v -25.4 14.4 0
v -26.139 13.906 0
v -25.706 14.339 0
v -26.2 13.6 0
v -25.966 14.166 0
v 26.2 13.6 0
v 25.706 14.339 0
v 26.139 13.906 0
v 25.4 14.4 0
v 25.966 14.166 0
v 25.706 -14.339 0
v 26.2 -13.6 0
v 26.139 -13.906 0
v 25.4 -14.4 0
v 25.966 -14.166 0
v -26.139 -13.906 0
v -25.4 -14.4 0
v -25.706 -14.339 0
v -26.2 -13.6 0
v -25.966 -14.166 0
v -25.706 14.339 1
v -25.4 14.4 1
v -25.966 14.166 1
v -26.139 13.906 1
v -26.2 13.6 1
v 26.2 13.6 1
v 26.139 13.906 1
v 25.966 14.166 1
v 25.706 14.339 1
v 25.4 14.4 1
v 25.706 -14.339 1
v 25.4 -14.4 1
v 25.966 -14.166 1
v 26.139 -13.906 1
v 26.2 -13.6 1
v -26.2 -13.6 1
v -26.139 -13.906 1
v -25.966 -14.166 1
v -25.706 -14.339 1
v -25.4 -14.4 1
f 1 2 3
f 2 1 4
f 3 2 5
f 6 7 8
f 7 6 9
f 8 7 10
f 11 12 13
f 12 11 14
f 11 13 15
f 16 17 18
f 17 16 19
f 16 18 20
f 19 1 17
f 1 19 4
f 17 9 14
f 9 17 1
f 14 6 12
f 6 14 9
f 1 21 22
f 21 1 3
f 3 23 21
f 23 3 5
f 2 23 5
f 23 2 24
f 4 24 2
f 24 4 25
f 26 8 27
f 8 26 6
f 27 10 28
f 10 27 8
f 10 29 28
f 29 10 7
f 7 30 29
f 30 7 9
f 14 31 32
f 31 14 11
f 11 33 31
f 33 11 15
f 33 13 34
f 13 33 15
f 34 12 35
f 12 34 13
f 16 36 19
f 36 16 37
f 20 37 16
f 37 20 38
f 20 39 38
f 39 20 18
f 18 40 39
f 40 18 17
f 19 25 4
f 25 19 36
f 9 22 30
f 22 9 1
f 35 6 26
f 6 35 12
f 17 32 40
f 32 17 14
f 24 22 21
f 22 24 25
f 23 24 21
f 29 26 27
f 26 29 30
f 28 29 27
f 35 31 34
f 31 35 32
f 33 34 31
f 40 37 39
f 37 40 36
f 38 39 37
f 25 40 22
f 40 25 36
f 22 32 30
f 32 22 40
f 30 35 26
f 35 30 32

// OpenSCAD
// file: ../p/4-4edge.scad
use <../lib.scad>
$fa=1; $fs=0.2;
function ldraw_lib__4_4edge(realsolid=false) = [
// 0 Circle 1.0
// 0 Name: 4-4edge.dat
// 0 Author: James Jessiman
// 0 !LDRAW_ORG Primitive UPDATE 2017-01
// 0 !LICENSE Licensed under CC BY 2.0 and CC BY 4.0 : see CAreadme.txt
// 
// 0 BFC CERTIFY CCW
  [0,"BFC","CERTIFY"],
  [0,"BFC","CCW"],
// 
// 0 !HISTORY 1998-12-15 [PTadmin] Official Update 1998-10
// 0 !HISTORY 2005-12-28 [PTadmin] Official Update 2005-01
// 0 !HISTORY 2007-06-24 [PTadmin] Header formatted for Contributor Agreement
// 0 !HISTORY 2008-07-01 [PTadmin] Official Update 2008-01
// 0 !HISTORY 2017-01-15 [Steffen] BFCed
// 0 !HISTORY 2017-12-30 [PTadmin] Official Update 2017-01
// 
// 
// 2 24 1 0 0 0.9239 0 0.3827
  [2,24,1,0,0,0.9239,0,0.3827],
// 2 24 0.9239 0 0.3827 0.7071 0 0.7071
  [2,24,0.9239,0,0.3827,0.7071,0,0.7071],
// 2 24 0.7071 0 0.7071 0.3827 0 0.9239
  [2,24,0.7071,0,0.7071,0.3827,0,0.9239],
// 2 24 0.3827 0 0.9239 0 0 1
  [2,24,0.3827,0,0.9239,0,0,1],
// 2 24 0 0 1 -0.3827 0 0.9239
  [2,24,0,0,1,-0.3827,0,0.9239],
// 2 24 -0.3827 0 0.9239 -0.7071 0 0.7071
  [2,24,-0.3827,0,0.9239,-0.7071,0,0.7071],
// 2 24 -0.7071 0 0.7071 -0.9239 0 0.3827
  [2,24,-0.7071,0,0.7071,-0.9239,0,0.3827],
// 2 24 -0.9239 0 0.3827 -1 0 -0
  [2,24,-0.9239,0,0.3827,-1,0,-0],
// 2 24 -1 0 -0 -0.9239 0 -0.3827
  [2,24,-1,0,-0,-0.9239,0,-0.3827],
// 2 24 -0.9239 0 -0.3827 -0.7071 0 -0.7071
  [2,24,-0.9239,0,-0.3827,-0.7071,0,-0.7071],
// 2 24 -0.7071 0 -0.7071 -0.3827 0 -0.9239
  [2,24,-0.7071,0,-0.7071,-0.3827,0,-0.9239],
// 2 24 -0.3827 0 -0.9239 0 0 -1
  [2,24,-0.3827,0,-0.9239,0,0,-1],
// 2 24 0 0 -1 0.3827 0 -0.9239
  [2,24,0,0,-1,0.3827,0,-0.9239],
// 2 24 0.3827 0 -0.9239 0.7071 0 -0.7071
  [2,24,0.3827,0,-0.9239,0.7071,0,-0.7071],
// 2 24 0.7071 0 -0.7071 0.9239 0 -0.3827
  [2,24,0.7071,0,-0.7071,0.9239,0,-0.3827],
// 2 24 0.9239 0 -0.3827 1 0 0
  [2,24,0.9239,0,-0.3827,1,0,0],
];
module ldraw_lib__4_4edge(step=0, col=false, unit=2/5, alt=false, line=0.2, solid=!$preview)
    makepoly(ldraw_lib__4_4edge(solid), step=step, col=col, unit=unit, alt=alt, line=line, solid=solid);
ldraw_lib__4_4edge(line=0.2);
// file: ../p/4-4disc.scad
use <../lib.scad>
$fa=1; $fs=0.2;
function ldraw_lib__4_4disc(realsolid=false) = [
// 0 Disc 1.0
// 0 Name: 4-4disc.dat
// 0 Author: James Jessiman
// 0 !LDRAW_ORG Primitive UPDATE 2002-02
// 0 !LICENSE Licensed under CC BY 2.0 and CC BY 4.0 : see CAreadme.txt
// 
// 0 BFC CERTIFY CCW
  [0,"BFC","CERTIFY"],
  [0,"BFC","CCW"],
// 
// 0 !HISTORY 1998-12-15 [PTadmin] Official Update 1998-10
// 0 !HISTORY 2002-03-23 [sbliss] Added BFC statement
// 0 !HISTORY 2002-04-25 [PTadmin] Official Update 2002-02
// 0 !HISTORY 2007-06-24 [PTadmin] Header formatted for Contributor Agreement
// 0 !HISTORY 2008-07-01 [PTadmin] Official Update 2008-01
// 
// 
// 3 16 0 0 0 1 0 0 0.9239 0 0.3827
  [3,16,0,0,0,1,0,0,0.9239,0,0.3827],
// 3 16 0 0 0 0.9239 0 0.3827 0.7071 0 0.7071
  [3,16,0,0,0,0.9239,0,0.3827,0.7071,0,0.7071],
// 3 16 0 0 0 0.7071 0 0.7071 0.3827 0 0.9239
  [3,16,0,0,0,0.7071,0,0.7071,0.3827,0,0.9239],
// 3 16 0 0 0 0.3827 0 0.9239 0 0 1
  [3,16,0,0,0,0.3827,0,0.9239,0,0,1],
// 3 16 0 0 0 0 0 1 -0.3827 0 0.9239
  [3,16,0,0,0,0,0,1,-0.3827,0,0.9239],
// 3 16 0 0 0 -0.3827 0 0.9239 -0.7071 0 0.7071
  [3,16,0,0,0,-0.3827,0,0.9239,-0.7071,0,0.7071],
// 3 16 0 0 0 -0.7071 0 0.7071 -0.9239 0 0.3827
  [3,16,0,0,0,-0.7071,0,0.7071,-0.9239,0,0.3827],
// 3 16 0 0 0 -0.9239 0 0.3827 -1 0 -0
  [3,16,0,0,0,-0.9239,0,0.3827,-1,0,-0],
// 3 16 0 0 0 -1 0 -0 -0.9239 0 -0.3827
  [3,16,0,0,0,-1,0,-0,-0.9239,0,-0.3827],
// 3 16 0 0 0 -0.9239 0 -0.3827 -0.7071 0 -0.7071
  [3,16,0,0,0,-0.9239,0,-0.3827,-0.7071,0,-0.7071],
// 3 16 0 0 0 -0.7071 0 -0.7071 -0.3827 0 -0.9239
  [3,16,0,0,0,-0.7071,0,-0.7071,-0.3827,0,-0.9239],
// 3 16 0 0 0 -0.3827 0 -0.9239 0 0 -1
  [3,16,0,0,0,-0.3827,0,-0.9239,0,0,-1],
// 3 16 0 0 0 0 0 -1 0.3827 0 -0.9239
  [3,16,0,0,0,0,0,-1,0.3827,0,-0.9239],
// 3 16 0 0 0 0.3827 0 -0.9239 0.7071 0 -0.7071
  [3,16,0,0,0,0.3827,0,-0.9239,0.7071,0,-0.7071],
// 3 16 0 0 0 0.7071 0 -0.7071 0.9239 0 -0.3827
  [3,16,0,0,0,0.7071,0,-0.7071,0.9239,0,-0.3827],
// 3 16 0 0 0 0.9239 0 -0.3827 1 0 0
  [3,16,0,0,0,0.9239,0,-0.3827,1,0,0],
// 0
];
module ldraw_lib__4_4disc(step=0, col=false, unit=2/5, alt=false, line=0.2, solid=!$preview)
    makepoly(ldraw_lib__4_4disc(solid), step=step, col=col, unit=unit, alt=alt, line=line, solid=solid);
ldraw_lib__4_4disc(line=0.2);
// file: ../p/4-4cyli.scad
use <../lib.scad>
$fa=1; $fs=0.2;
function ldraw_lib__4_4cyli(realsolid=false) = [
// 0 Cylinder 1.0
// 0 Name: 4-4cyli.dat
// 0 Author: James Jessiman
// 0 !LDRAW_ORG Primitive UPDATE 2005-01
// 0 !LICENSE Licensed under CC BY 2.0 and CC BY 4.0 : see CAreadme.txt
// 
// 0 BFC CERTIFY CCW
  [0,"BFC","CERTIFY"],
  [0,"BFC","CCW"],
// 
// 0 !HISTORY 1998-12-15 [PTadmin] Official Update 1998-10
// 0 !HISTORY 2002-03-23 [sbliss] Added BFC statement; merged headers from files in distributions LDraw 0.27 and Complete.
// 0 !HISTORY 2002-04-25 [PTadmin] Official Update 2002-02
// 0 !HISTORY 2004-12-14 [guyvivan] BFC CCW
// 0 !HISTORY 2005-12-28 [PTadmin] Official Update 2005-01
// 0 !HISTORY 2007-06-24 [PTadmin] Header formatted for Contributor Agreement
// 0 !HISTORY 2008-07-01 [PTadmin] Official Update 2008-01
// 
// 
// 4 16 1 1 0 0.9239 1 0.3827 0.9239 0 0.3827 1 0 0
  [4,16,1,1,0,0.9239,1,0.3827,0.9239,0,0.3827,1,0,0],
// 5 24 1 0 0 1 1 0 0.9239 0 0.3827 0.9239 0 -0.3827
  [5,24,1,0,0,1,1,0,0.9239,0,0.3827,0.9239,0,-0.3827],
// 4 16 0.9239 1 0.3827 0.7071 1 0.7071 0.7071 0 0.7071 0.9239 0 0.3827
  [4,16,0.9239,1,0.3827,0.7071,1,0.7071,0.7071,0,0.7071,0.9239,0,0.3827],
// 5 24 0.9239 0 0.3827 0.9239 1 0.3827 0.7071 0 0.7071 1 0 0
  [5,24,0.9239,0,0.3827,0.9239,1,0.3827,0.7071,0,0.7071,1,0,0],
// 4 16 0.7071 1 0.7071 0.3827 1 0.9239 0.3827 0 0.9239 0.7071 0 0.7071
  [4,16,0.7071,1,0.7071,0.3827,1,0.9239,0.3827,0,0.9239,0.7071,0,0.7071],
// 5 24 0.7071 0 0.7071 0.7071 1 0.7071 0.3827 0 0.9239 0.9239 0 0.3827
  [5,24,0.7071,0,0.7071,0.7071,1,0.7071,0.3827,0,0.9239,0.9239,0,0.3827],
// 4 16 0.3827 1 0.9239 0 1 1 0 0 1 0.3827 0 0.9239
  [4,16,0.3827,1,0.9239,0,1,1,0,0,1,0.3827,0,0.9239],
// 5 24 0.3827 0 0.9239 0.3827 1 0.9239 0 0 1 0.7071 0 0.7071
  [5,24,0.3827,0,0.9239,0.3827,1,0.9239,0,0,1,0.7071,0,0.7071],
// 4 16 0 1 1 -0.3827 1 0.9239 -0.3827 0 0.9239 0 0 1
  [4,16,0,1,1,-0.3827,1,0.9239,-0.3827,0,0.9239,0,0,1],
// 5 24 0 0 1 0 1 1 -0.3827 0 0.9239 0.3827 0 0.9239
  [5,24,0,0,1,0,1,1,-0.3827,0,0.9239,0.3827,0,0.9239],
// 4 16 -0.3827 1 0.9239 -0.7071 1 0.7071 -0.7071 0 0.7071 -0.3827 0 0.9239
  [4,16,-0.3827,1,0.9239,-0.7071,1,0.7071,-0.7071,0,0.7071,-0.3827,0,0.9239],
// 5 24 -0.3827 0 0.9239 -0.3827 1 0.9239 -0.7071 0 0.7071 0 0 1
  [5,24,-0.3827,0,0.9239,-0.3827,1,0.9239,-0.7071,0,0.7071,0,0,1],
// 4 16 -0.7071 1 0.7071 -0.9239 1 0.3827 -0.9239 0 0.3827 -0.7071 0 0.7071
  [4,16,-0.7071,1,0.7071,-0.9239,1,0.3827,-0.9239,0,0.3827,-0.7071,0,0.7071],
// 5 24 -0.7071 0 0.7071 -0.7071 1 0.7071 -0.9239 0 0.3827 -0.3827 0 0.9239
  [5,24,-0.7071,0,0.7071,-0.7071,1,0.7071,-0.9239,0,0.3827,-0.3827,0,0.9239],
// 4 16 -0.9239 1 0.3827 -1 1 0 -1 0 0 -0.9239 0 0.3827
  [4,16,-0.9239,1,0.3827,-1,1,0,-1,0,0,-0.9239,0,0.3827],
// 5 24 -0.9239 0 0.3827 -0.9239 1 0.3827 -1 0 0 -0.7071 0 0.7071
  [5,24,-0.9239,0,0.3827,-0.9239,1,0.3827,-1,0,0,-0.7071,0,0.7071],
// 4 16 -1 1 0 -0.9239 1 -0.3827 -0.9239 0 -0.3827 -1 0 0
  [4,16,-1,1,0,-0.9239,1,-0.3827,-0.9239,0,-0.3827,-1,0,0],
// 5 24 -1 0 0 -1 1 0 -0.9239 0 -0.3827 -0.9239 0 0.3827
  [5,24,-1,0,0,-1,1,0,-0.9239,0,-0.3827,-0.9239,0,0.3827],
// 4 16 -0.9239 1 -0.3827 -0.7071 1 -0.7071 -0.7071 0 -0.7071 -0.9239 0 -0.3827
  [4,16,-0.9239,1,-0.3827,-0.7071,1,-0.7071,-0.7071,0,-0.7071,-0.9239,0,-0.3827],
// 5 24 -0.9239 0 -0.3827 -0.9239 1 -0.3827 -0.7071 0 -0.7071 -1 0 0
  [5,24,-0.9239,0,-0.3827,-0.9239,1,-0.3827,-0.7071,0,-0.7071,-1,0,0],
// 4 16 -0.7071 1 -0.7071 -0.3827 1 -0.9239 -0.3827 0 -0.9239 -0.7071 0 -0.7071
  [4,16,-0.7071,1,-0.7071,-0.3827,1,-0.9239,-0.3827,0,-0.9239,-0.7071,0,-0.7071],
// 5 24 -0.7071 0 -0.7071 -0.7071 1 -0.7071 -0.3827 0 -0.9239 -0.9239 0 -0.3827
  [5,24,-0.7071,0,-0.7071,-0.7071,1,-0.7071,-0.3827,0,-0.9239,-0.9239,0,-0.3827],
// 4 16 -0.3827 1 -0.9239 0 1 -1 0 0 -1 -0.3827 0 -0.9239
  [4,16,-0.3827,1,-0.9239,0,1,-1,0,0,-1,-0.3827,0,-0.9239],
// 5 24 -0.3827 0 -0.9239 -0.3827 1 -0.9239 0 0 -1 -0.7071 0 -0.7071
  [5,24,-0.3827,0,-0.9239,-0.3827,1,-0.9239,0,0,-1,-0.7071,0,-0.7071],
// 4 16 0 1 -1 0.3827 1 -0.9239 0.3827 0 -0.9239 0 0 -1
  [4,16,0,1,-1,0.3827,1,-0.9239,0.3827,0,-0.9239,0,0,-1],
// 5 24 0 0 -1 0 1 -1 0.3827 0 -0.9239 -0.3827 0 -0.9239
  [5,24,0,0,-1,0,1,-1,0.3827,0,-0.9239,-0.3827,0,-0.9239],
// 4 16 0.3827 1 -0.9239 0.7071 1 -0.7071 0.7071 0 -0.7071 0.3827 0 -0.9239
  [4,16,0.3827,1,-0.9239,0.7071,1,-0.7071,0.7071,0,-0.7071,0.3827,0,-0.9239],
// 5 24 0.3827 0 -0.9239 0.3827 1 -0.9239 0.7071 0 -0.7071 0 0 -1
  [5,24,0.3827,0,-0.9239,0.3827,1,-0.9239,0.7071,0,-0.7071,0,0,-1],
// 4 16 0.7071 1 -0.7071 0.9239 1 -0.3827 0.9239 0 -0.3827 0.7071 0 -0.7071
  [4,16,0.7071,1,-0.7071,0.9239,1,-0.3827,0.9239,0,-0.3827,0.7071,0,-0.7071],
// 5 24 0.7071 0 -0.7071 0.7071 1 -0.7071 0.9239 0 -0.3827 0.3827 0 -0.9239
  [5,24,0.7071,0,-0.7071,0.7071,1,-0.7071,0.9239,0,-0.3827,0.3827,0,-0.9239],
// 4 16 0.9239 1 -0.3827 1 1 0 1 0 0 0.9239 0 -0.3827
  [4,16,0.9239,1,-0.3827,1,1,0,1,0,0,0.9239,0,-0.3827],
// 5 24 0.9239 0 -0.3827 0.9239 1 -0.3827 1 0 0 0.7071 0 -0.7071
  [5,24,0.9239,0,-0.3827,0.9239,1,-0.3827,1,0,0,0.7071,0,-0.7071],
// 0
];
module ldraw_lib__4_4cyli(step=0, col=false, unit=2/5, alt=false, line=0.2, solid=!$preview)
    makepoly(ldraw_lib__4_4cyli(solid), step=step, col=col, unit=unit, alt=alt, line=line, solid=solid);
ldraw_lib__4_4cyli(line=0.2);
// file: ../p/stud3.scad
use <../lib.scad>
use <4-4cyli.scad>
use <4-4disc.scad>
use <4-4edge.scad>
$fa=1; $fs=0.2;
function ldraw_lib__stud3(realsolid=false) = realsolid ? 
    [openscad(translate([0,0,-eps()], o=cylinder(4+eps(), r=4)),2)] : [
// 0 Stud Tube Solid
// 0 Name: stud3.dat
// 0 Author: James Jessiman
// 0 !LDRAW_ORG Primitive UPDATE 2012-01
// 0 !LICENSE Licensed under CC BY 2.0 and CC BY 4.0 : see CAreadme.txt
// 
// 0 BFC CERTIFY CCW
  [0,"BFC","CERTIFY"],
  [0,"BFC","CCW"],
// 
// 0 !HISTORY 2002-04-04 [sbliss] Modified for BFC compliance
// 0 !HISTORY 2002-04-25 [PTadmin] Official Update 2002-02
// 0 !HISTORY 2007-06-24 [PTadmin] Header formatted for Contributor Agreement
// 0 !HISTORY 2008-07-01 [PTadmin] Official Update 2008-01
// 0 !HISTORY 2012-02-16 [Philo] Changed to CCW
// 0 !HISTORY 2012-03-30 [PTadmin] Official Update 2012-01
// 
// 
// 1 16 0 -4 0 4 0 0 0 1 0 0 0 4 4-4edge.dat
  [1,16,0,-4,0,4,0,0,0,1,0,0,0,4, ldraw_lib__4_4edge(realsolid)],
// 1 16 0 0 0 4 0 0 0 1 0 0 0 4 4-4edge.dat
  [1,16,0,0,0,4,0,0,0,1,0,0,0,4, ldraw_lib__4_4edge(realsolid)],
// 1 16 0 -4 0 4 0 0 0 1 0 0 0 4 4-4disc.dat
  [1,16,0,-4,0,4,0,0,0,1,0,0,0,4, ldraw_lib__4_4disc(realsolid)],
// 1 16 0 -4 0 4 0 0 0 4 0 0 0 4 4-4cyli.dat
  [1,16,0,-4,0,4,0,0,0,4,0,0,0,4, ldraw_lib__4_4cyli(realsolid)],
];
module ldraw_lib__stud3(step=0, col=false, unit=2/5, alt=false, line=0.2, solid=!$preview)
    makepoly(ldraw_lib__stud3(solid), step=step, col=col, unit=unit, alt=alt, line=line, solid=solid);
ldraw_lib__stud3(line=0.2);
// file: ../p/stud.scad
use <../lib.scad>
use <4-4cyli.scad>
use <4-4disc.scad>
use <4-4edge.scad>
$fa=1; $fs=0.2;
function ldraw_lib__stud(realsolid=false) = realsolid ? 
    [openscad(translate([0,0,-eps()], o=cylinder(4+eps(), r=6)),2)] : [
// 0 Stud
// 0 Name: stud.dat
// 0 Author: James Jessiman
// 0 !LDRAW_ORG Primitive UPDATE 2012-01
// 0 !LICENSE Licensed under CC BY 2.0 and CC BY 4.0 : see CAreadme.txt
// 
// 0 BFC CERTIFY CCW
  [0,"BFC","CERTIFY"],
  [0,"BFC","CCW"],
// 
// 0 !HISTORY 2002-04-04 [sbliss] Modified for BFC compliance
// 0 !HISTORY 2002-04-25 [PTadmin] Official Update 2002-02
// 0 !HISTORY 2007-06-24 [PTadmin] Header formatted for Contributor Agreement
// 0 !HISTORY 2008-07-01 [PTadmin] Official Update 2008-01
// 0 !HISTORY 2012-02-16 [Philo] Changed to CCW
// 0 !HISTORY 2012-03-30 [PTadmin] Official Update 2012-01
// 
// 
// 1 16 0 0 0 6 0 0 0 1 0 0 0 6 4-4edge.dat
  [1,16,0,0,0,6,0,0,0,1,0,0,0,6, ldraw_lib__4_4edge(realsolid)],
// 1 16 0 -4 0 6 0 0 0 1 0 0 0 6 4-4edge.dat
  [1,16,0,-4,0,6,0,0,0,1,0,0,0,6, ldraw_lib__4_4edge(realsolid)],
// 1 16 0 0 0 6 0 0 0 -4 0 0 0 6 4-4cyli.dat
  [1,16,0,0,0,6,0,0,0,-4,0,0,0,6, ldraw_lib__4_4cyli(realsolid)],
// 1 16 0 -4 0 6 0 0 0 1 0 0 0 6 4-4disc.dat
  [1,16,0,-4,0,6,0,0,0,1,0,0,0,6, ldraw_lib__4_4disc(realsolid)],
];
module ldraw_lib__stud(step=0, col=false, unit=2/5, alt=false, line=0.2, solid=!$preview)
    makepoly(ldraw_lib__stud(solid), step=step, col=col, unit=unit, alt=alt, line=line, solid=solid);
ldraw_lib__stud(line=0.2);
// file: ../p/box5.scad
use <../lib.scad>
$fa=1; $fs=0.2;
function ldraw_lib__box5(realsolid=false) = [
// 0 Box with 5 Faces and All Edges
// 0 Name: box5.dat
// 0 Author: James Jessiman
// 0 !LDRAW_ORG Primitive UPDATE 2012-01
// 0 !LICENSE Licensed under CC BY 2.0 and CC BY 4.0 : see CAreadme.txt
// 
// 0 BFC CERTIFY CCW
  [0,"BFC","CERTIFY"],
  [0,"BFC","CCW"],
// 
// 0 !HISTORY 2002-04-03 [sbliss] Modified for BFC compliance
// 0 !HISTORY 2002-04-25 [PTadmin] Official Update 2002-02
// 0 !HISTORY 2007-06-24 [PTadmin] Header formatted for Contributor Agreement
// 0 !HISTORY 2008-07-01 [PTadmin] Official Update 2008-01
// 0 !HISTORY 2012-02-16 [Philo] Changed to CCW
// 0 !HISTORY 2012-03-30 [PTadmin] Official Update 2012-01
// 
// 
// 2 24 1 1 1 -1 1 1
  [2,24,1,1,1,-1,1,1],
// 2 24 -1 1 1 -1 1 -1
  [2,24,-1,1,1,-1,1,-1],
// 2 24 -1 1 -1 1 1 -1
  [2,24,-1,1,-1,1,1,-1],
// 2 24 1 1 -1 1 1 1
  [2,24,1,1,-1,1,1,1],
// 2 24 1 0 1 -1 0 1
  [2,24,1,0,1,-1,0,1],
// 2 24 -1 0 1 -1 0 -1
  [2,24,-1,0,1,-1,0,-1],
// 2 24 -1 0 -1 1 0 -1
  [2,24,-1,0,-1,1,0,-1],
// 2 24 1 0 -1 1 0 1
  [2,24,1,0,-1,1,0,1],
// 2 24 1 0 1 1 1 1
  [2,24,1,0,1,1,1,1],
// 2 24 -1 0 1 -1 1 1
  [2,24,-1,0,1,-1,1,1],
// 2 24 1 0 -1 1 1 -1
  [2,24,1,0,-1,1,1,-1],
// 2 24 -1 0 -1 -1 1 -1
  [2,24,-1,0,-1,-1,1,-1],
// 4 16 -1 1 1 1 1 1 1 1 -1 -1 1 -1
  [4,16,-1,1,1,1,1,1,1,1,-1,-1,1,-1],
// 4 16 -1 1 1 -1 0 1 1 0 1 1 1 1
  [4,16,-1,1,1,-1,0,1,1,0,1,1,1,1],
// 4 16 -1 1 -1 -1 0 -1 -1 0 1 -1 1 1
  [4,16,-1,1,-1,-1,0,-1,-1,0,1,-1,1,1],
// 4 16 1 1 -1 1 0 -1 -1 0 -1 -1 1 -1
  [4,16,1,1,-1,1,0,-1,-1,0,-1,-1,1,-1],
// 4 16 1 1 1 1 0 1 1 0 -1 1 1 -1
  [4,16,1,1,1,1,0,1,1,0,-1,1,1,-1],
];
module ldraw_lib__box5(step=0, col=false, unit=2/5, alt=false, line=0.2, solid=!$preview)
    makepoly(ldraw_lib__box5(solid), step=step, col=col, unit=unit, alt=alt, line=line, solid=solid);
ldraw_lib__box5(line=0.2);
// file: ../p/box4t.scad
use <../lib.scad>
$fa=1; $fs=0.2;
function ldraw_lib__box4t(realsolid=false) = [
// 0 Box with 4 Adjacent Faces and All Edges
// 0 Name: box4t.dat
// 0 Author: Tore Eriksson [Tore_Eriksson]
// 0 !LDRAW_ORG Primitive UPDATE 2003-02
// 0 !LICENSE Licensed under CC BY 2.0 and CC BY 4.0 : see CAreadme.txt
// 
// 0 BFC CERTIFY CCW
  [0,"BFC","CERTIFY"],
  [0,"BFC","CCW"],
// 
// 0 !HISTORY 1997-09-29 [PTadmin] Official Update 1997-15
// 0 !HISTORY 2002-08-31 [izanette] Modified with WINDZ for BFC compliance
// 0 !HISTORY 2003-08-01 [PTadmin] Official Update 2003-02
// 0 !HISTORY 2007-06-24 [PTadmin] Header formatted for Contributor Agreement
// 0 !HISTORY 2008-07-01 [PTadmin] Official Update 2008-01
// 
// 
// 2 24 1 1 1 -1 1 1
  [2,24,1,1,1,-1,1,1],
// 2 24 -1 1 1 -1 1 -1
  [2,24,-1,1,1,-1,1,-1],
// 2 24 -1 1 -1 1 1 -1
  [2,24,-1,1,-1,1,1,-1],
// 2 24 1 1 -1 1 1 1
  [2,24,1,1,-1,1,1,1],
// 2 24 1 0 1 -1 0 1
  [2,24,1,0,1,-1,0,1],
// 2 24 -1 0 1 -1 0 -1
  [2,24,-1,0,1,-1,0,-1],
// 2 24 -1 0 -1 1 0 -1
  [2,24,-1,0,-1,1,0,-1],
// 2 24 1 0 -1 1 0 1
  [2,24,1,0,-1,1,0,1],
// 2 24 1 0 1 1 1 1
  [2,24,1,0,1,1,1,1],
// 2 24 -1 0 1 -1 1 1
  [2,24,-1,0,1,-1,1,1],
// 2 24 1 0 -1 1 1 -1
  [2,24,1,0,-1,1,1,-1],
// 2 24 -1 0 -1 -1 1 -1
  [2,24,-1,0,-1,-1,1,-1],
// 4 16 1 1 1 1 1 -1 -1 1 -1 -1 1 1
  [4,16,1,1,1,1,1,-1,-1,1,-1,-1,1,1],
// 4 16 1 1 1 -1 1 1 -1 0 1 1 0 1
  [4,16,1,1,1,-1,1,1,-1,0,1,1,0,1],
// 4 16 -1 1 1 -1 1 -1 -1 0 -1 -1 0 1
  [4,16,-1,1,1,-1,1,-1,-1,0,-1,-1,0,1],
// 0 4 16 -1 1 -1 -1 0 -1 1 0 -1 1 1 -1
// 4 16 1 1 -1 1 1 1 1 0 1 1 0 -1
  [4,16,1,1,-1,1,1,1,1,0,1,1,0,-1],
// 0
];
module ldraw_lib__box4t(step=0, col=false, unit=2/5, alt=false, line=0.2, solid=!$preview)
    makepoly(ldraw_lib__box4t(solid), step=step, col=col, unit=unit, alt=alt, line=line, solid=solid);
ldraw_lib__box4t(line=0.2);
// file: s/3004s01.scad
use <../../lib.scad>
use <../../p/box4t.scad>
use <../../p/box5.scad>
use <../../p/stud.scad>
use <../../p/stud3.scad>
$fa=1; $fs=0.2;
function ldraw_lib__s__3004s01(realsolid=false) = [
// 0 ~Brick  1 x  2 without Front Face
// 0 Name: s\3004s01.dat
// 0 Author: James Jessiman
// 0 !LDRAW_ORG Subpart UPDATE 2003-03
// 0 !LICENSE Licensed under CC BY 2.0 and CC BY 4.0 : see CAreadme.txt
// 
// 0 BFC CERTIFY CCW
  [0,"BFC","CERTIFY"],
  [0,"BFC","CCW"],
// 
// 0 !HISTORY 2003-09-07 [jriley] Subfiling, BFC
// 0 !HISTORY 2003-12-19 [PTadmin] Official Update 2003-03
// 0 !HISTORY 2007-08-29 [PTadmin] Header formatted for Contributor Agreement
// 0 !HISTORY 2008-07-01 [PTadmin] Official Update 2008-01
// 
// 
// 1 16 0 4 0 1 0 0 0 -5 0 0 0 1 stud3.dat
  [1,16,0,4,0,1,0,0,0,-5,0,0,0,1, ldraw_lib__stud3(realsolid)],
// 0 BFC INVERTNEXT
  [0,"BFC","INVERTNEXT"],
// 1 16 0 24 0 16 0 0 0 -20 0 0 0 6 box5.dat
  [1,16,0,24,0,16,0,0,0,-20,0,0,0,6, ldraw_lib__box5(realsolid)],
// 4 16 20 24 10 16 24 6 -16 24 6 -20 24 10
  [4,16,20,24,10,16,24,6,-16,24,6,-20,24,10],
// 4 16 -20 24 10 -16 24 6 -16 24 -6 -20 24 -10
  [4,16,-20,24,10,-16,24,6,-16,24,-6,-20,24,-10],
// 4 16 -20 24 -10 -16 24 -6 16 24 -6 20 24 -10
  [4,16,-20,24,-10,-16,24,-6,16,24,-6,20,24,-10],
// 4 16 20 24 -10 16 24 -6 16 24 6 20 24 10
  [4,16,20,24,-10,16,24,-6,16,24,6,20,24,10],
// 1 16 0 24 0 20 0 0 0 -24 0 0 0 10 box4t.dat
  [1,16,0,24,0,20,0,0,0,-24,0,0,0,10, ldraw_lib__box4t(realsolid)],
// 1 16 10 0 0 1 0 0 0 1 0 0 0 1 stud.dat
  [1,16,10,0,0,1,0,0,0,1,0,0,0,1, ldraw_lib__stud(realsolid)],
// 1 16 -10 0 0 1 0 0 0 1 0 0 0 1 stud.dat
  [1,16,-10,0,0,1,0,0,0,1,0,0,0,1, ldraw_lib__stud(realsolid)],
// 0
];
module ldraw_lib__s__3004s01(step=0, col=false, unit=2/5, alt=false, line=0.2, solid=!$preview)
    makepoly(ldraw_lib__s__3004s01(solid), step=step, col=col, unit=unit, alt=alt, line=line, solid=solid);
ldraw_lib__s__3004s01(line=0.2);
// file: ../p/1-4edge.scad
use <../lib.scad>
$fa=1; $fs=0.2;
function ldraw_lib__1_4edge(realsolid=false) = [
// 0 Circle 0.25
// 0 Name: 1-4edge.dat
// 0 Author: James Jessiman
// 0 !LDRAW_ORG Primitive UPDATE 2017-01
// 0 !LICENSE Licensed under CC BY 2.0 and CC BY 4.0 : see CAreadme.txt
// 
// 0 BFC CERTIFY CCW
  [0,"BFC","CERTIFY"],
  [0,"BFC","CCW"],
// 
// 0 !HISTORY 2007-06-22 [PTadmin] Header formatted for Contributor Agreement
// 0 !HISTORY 2008-07-01 [PTadmin] Official Update 2008-01
// 0 !HISTORY 2017-01-15 [Steffen] BFCed
// 0 !HISTORY 2017-12-30 [PTadmin] Official Update 2017-01
// 
// 
// 2 24 1 0 0 0.9239 0 0.3827
  [2,24,1,0,0,0.9239,0,0.3827],
// 2 24 0.9239 0 0.3827 0.7071 0 0.7071
  [2,24,0.9239,0,0.3827,0.7071,0,0.7071],
// 2 24 0.7071 0 0.7071 0.3827 0 0.9239
  [2,24,0.7071,0,0.7071,0.3827,0,0.9239],
// 2 24 0.3827 0 0.9239 0 0 1
  [2,24,0.3827,0,0.9239,0,0,1],
];
module ldraw_lib__1_4edge(step=0, col=false, unit=2/5, alt=false, line=0.2, solid=!$preview)
    makepoly(ldraw_lib__1_4edge(solid), step=step, col=col, unit=unit, alt=alt, line=line, solid=solid);
ldraw_lib__1_4edge(line=0.2);
// file: ../p/1-4cyli.scad
use <../lib.scad>
$fa=1; $fs=0.2;
function ldraw_lib__1_4cyli(realsolid=false) = [
// 0 Cylinder 0.25
// 0 Name: 1-4cyli.dat
// 0 Author: James Jessiman
// 0 !LDRAW_ORG Primitive UPDATE 2012-01
// 0 !LICENSE Licensed under CC BY 2.0 and CC BY 4.0 : see CAreadme.txt
// 
// 0 BFC CERTIFY CCW
  [0,"BFC","CERTIFY"],
  [0,"BFC","CCW"],
// 
// 0 !HISTORY 2002-03-23 [sbliss] Added BFC statement.
// 0 !HISTORY 2002-04-25 [PTadmin] Official Update 2002-02
// 0 !HISTORY 2007-06-22 [PTadmin] Header formatted for Contributor Agreement
// 0 !HISTORY 2008-07-01 [PTadmin] Official Update 2008-01
// 0 !HISTORY 2012-02-16 [Philo] Changed to CCW
// 0 !HISTORY 2012-03-30 [PTadmin] Official Update 2012-01
// 
// 
// 4 16 1 1 0 0.9239 1 0.3827 0.9239 0 0.3827 1 0 0
  [4,16,1,1,0,0.9239,1,0.3827,0.9239,0,0.3827,1,0,0],
// 5 24 1 0 0 1 1 0 0.9239 0 0.3827 1 0 -1
  [5,24,1,0,0,1,1,0,0.9239,0,0.3827,1,0,-1],
// 4 16 0.9239 1 0.3827 0.7071 1 0.7071 0.7071 0 0.7071 0.9239 0 0.3827
  [4,16,0.9239,1,0.3827,0.7071,1,0.7071,0.7071,0,0.7071,0.9239,0,0.3827],
// 5 24 0.9239 0 0.3827 0.9239 1 0.3827 0.7071 0 0.7071 1 0 0
  [5,24,0.9239,0,0.3827,0.9239,1,0.3827,0.7071,0,0.7071,1,0,0],
// 4 16 0.7071 1 0.7071 0.3827 1 0.9239 0.3827 0 0.9239 0.7071 0 0.7071
  [4,16,0.7071,1,0.7071,0.3827,1,0.9239,0.3827,0,0.9239,0.7071,0,0.7071],
// 5 24 0.7071 0 0.7071 0.7071 1 0.7071 0.3827 0 0.9239 0.9239 0 0.3827
  [5,24,0.7071,0,0.7071,0.7071,1,0.7071,0.3827,0,0.9239,0.9239,0,0.3827],
// 4 16 0.3827 1 0.9239 0 1 1 0 0 1 0.3827 0 0.9239
  [4,16,0.3827,1,0.9239,0,1,1,0,0,1,0.3827,0,0.9239],
// 5 24 0.3827 0 0.9239 0.3827 1 0.9239 0 0 1 0.7071 0 0.7071
  [5,24,0.3827,0,0.9239,0.3827,1,0.9239,0,0,1,0.7071,0,0.7071],
// 5 24 0 0 1 0 1 1 0.3827 0 0.9239 -1 0 1
  [5,24,0,0,1,0,1,1,0.3827,0,0.9239,-1,0,1],
];
module ldraw_lib__1_4cyli(step=0, col=false, unit=2/5, alt=false, line=0.2, solid=!$preview)
    makepoly(ldraw_lib__1_4cyli(solid), step=step, col=col, unit=unit, alt=alt, line=line, solid=solid);
ldraw_lib__1_4cyli(line=0.2);
// file: 3004.scad
use <../lib.scad>
use <s/3004s01.scad>
$fa=1; $fs=0.2;
function ldraw_lib__3004(realsolid=false) = [
// 0 Brick  1 x  2
// 0 Name: 3004.dat
// 0 Author: James Jessiman
// 0 !LDRAW_ORG Part UPDATE 2022-05
// 0 !LICENSE Licensed under CC BY 2.0 and CC BY 4.0 : see CAreadme.txt
// 
// 0 BFC CERTIFY CCW
  [0,"BFC","CERTIFY"],
  [0,"BFC","CCW"],
// 
// 0 !HISTORY 2001-10-26 [PTadmin] Official Update 2001-01
// 0 !HISTORY 2002-05-07 {unknown} BFC Certification
// 0 !HISTORY 2002-06-11 [PTadmin] Official Update 2002-03
// 0 !HISTORY 2007-05-07 [PTadmin] Header formatted for Contributor Agreement
// 0 !HISTORY 2008-07-01 [PTadmin] Official Update 2008-01
// 0 !HISTORY 2022-08-04 [MagFors] Using subfile
// 0 !HISTORY 2022-09-15 [PTadmin] Official Update 2022-05
// 
// 
// 1 16 0 0 0 1 0 0 0 1 0 0 0 1 s\3004s01.dat
  [1,16,0,0,0,1,0,0,0,1,0,0,0,1, ldraw_lib__s__3004s01(realsolid)],
// 4 16 -20 24 -10 20 24 -10 20 0 -10 -20 0 -10
  [4,16,-20,24,-10,20,24,-10,20,0,-10,-20,0,-10],
];
module ldraw_lib__3004(step=0, col=false, unit=2/5, alt=false, line=0.2, solid=!$preview)
    makepoly(ldraw_lib__3004(solid), step=step, col=col, unit=unit, alt=alt, line=line, solid=solid);
ldraw_lib__3004(line=0.2);
// file: ../p/rect2p.scad
use <../lib.scad>
$fa=1; $fs=0.2;
function ldraw_lib__rect2p(realsolid=false) = [
// 0 Rectangle with 2 Parallel Edges
// 0 Name: rect2p.dat
// 0 Author: Donald Sutter [technog]
// 0 !LDRAW_ORG Primitive UPDATE 2010-01
// 0 !LICENSE Licensed under CC BY 2.0 and CC BY 4.0 : see CAreadme.txt
// 
// 0 BFC CERTIFY CCW
  [0,"BFC","CERTIFY"],
  [0,"BFC","CCW"],
// 
// 0 !HISTORY 2003-08-01 [PTadmin] Official Update 2003-02
// 0 !HISTORY 2007-06-24 [PTadmin] Header formatted for Contributor Agreement
// 0 !HISTORY 2008-07-01 [PTadmin] Official Update 2008-01
// 0 !HISTORY 2010-01-17 [mikeheide] changed winding to CCW
// 0 !HISTORY 2010-04-05 [PTadmin] Official Update 2010-01
// 
// 
// 2 24 1 0 1 -1 0 1
  [2,24,1,0,1,-1,0,1],
// 2 24 -1 0 -1 1 0 -1
  [2,24,-1,0,-1,1,0,-1],
// 4 16 -1 0 1 -1 0 -1 1 0 -1 1 0 1
  [4,16,-1,0,1,-1,0,-1,1,0,-1,1,0,1],
// 0
];
module ldraw_lib__rect2p(step=0, col=false, unit=2/5, alt=false, line=0.2, solid=!$preview)
    makepoly(ldraw_lib__rect2p(solid), step=step, col=col, unit=unit, alt=alt, line=line, solid=solid);
ldraw_lib__rect2p(line=0.2);
// file: ../p/1-4cylo.scad
use <../lib.scad>
use <1-4cyli.scad>
use <1-4edge.scad>
$fa=1; $fs=0.2;
function ldraw_lib__1_4cylo(realsolid=false) = [
// 0 Cylinder Open 0.25
// 0 Name: 1-4cylo.dat
// 0 Author: Max Martin Richter [MMR1988]
// 0 !LDRAW_ORG Primitive UPDATE 2010-03
// 0 !LICENSE Licensed under CC BY 2.0 and CC BY 4.0 : see CAreadme.txt
// 
// 0 BFC CERTIFY CCW
  [0,"BFC","CERTIFY"],
  [0,"BFC","CCW"],
// 
// 0 !HISTORY 2010-12-31 [PTadmin] Official Update 2010-03
// 
// 
// 1 16 0 0 0 1 0 0 0 1 0 0 0 1 1-4edge.dat
  [1,16,0,0,0,1,0,0,0,1,0,0,0,1, ldraw_lib__1_4edge(realsolid)],
// 1 16 0 1 0 1 0 0 0 1 0 0 0 1 1-4edge.dat
  [1,16,0,1,0,1,0,0,0,1,0,0,0,1, ldraw_lib__1_4edge(realsolid)],
// 1 16 0 0 0 1 0 0 0 1 0 0 0 1 1-4cyli.dat
  [1,16,0,0,0,1,0,0,0,1,0,0,0,1, ldraw_lib__1_4cyli(realsolid)],
];
module ldraw_lib__1_4cylo(step=0, col=false, unit=2/5, alt=false, line=0.2, solid=!$preview)
    makepoly(ldraw_lib__1_4cylo(solid), step=step, col=col, unit=unit, alt=alt, line=line, solid=solid);
ldraw_lib__1_4cylo(line=0.2);
// file: ../p/1-4chrd.scad
use <../lib.scad>
$fa=1; $fs=0.2;
function ldraw_lib__1_4chrd(realsolid=false) = [
// 0 Chord 0.25
// 0 Name: 1-4chrd.dat
// 0 Author: Tony Hafner [hafhead]
// 0 !LDRAW_ORG Primitive UPDATE 2012-02
// 0 !LICENSE Licensed under CC BY 2.0 and CC BY 4.0 : see CAreadme.txt
// 
// 0 BFC CERTIFY CCW
  [0,"BFC","CERTIFY"],
  [0,"BFC","CCW"],
// 
// 0 !HISTORY 2004-04-22 [PTadmin] Official Update 2004-02
// 0 !HISTORY 2007-10-09 [PTadmin] Header formatted for Contributor Agreement
// 0 !HISTORY 2008-07-01 [PTadmin] Official Update 2008-01
// 0 !HISTORY 2012-08-02 [MMR1988] Re-creation with PrimGen2 and Rectifier
// 0 !HISTORY 2012-08-09 [PTadmin] Official Update 2012-02
// 
// 
// 4 16 0.9239 0 0.3827 0.3827 0 0.9239 0 0 1 1 0 0
  [4,16,0.9239,0,0.3827,0.3827,0,0.9239,0,0,1,1,0,0],
// 3 16 0.7071 0 0.7071 0.3827 0 0.9239 0.9239 0 0.3827
  [3,16,0.7071,0,0.7071,0.3827,0,0.9239,0.9239,0,0.3827],
];
module ldraw_lib__1_4chrd(step=0, col=false, unit=2/5, alt=false, line=0.2, solid=!$preview)
    makepoly(ldraw_lib__1_4chrd(solid), step=step, col=col, unit=unit, alt=alt, line=line, solid=solid);
ldraw_lib__1_4chrd(line=0.2);
// main file
use <../lib.scad>
use <../p/1-4chrd.scad>
use <../p/1-4cylo.scad>
use <../p/rect2p.scad>
$fa=1; $fs=0.2;
function ldraw_lib__20193(realsolid=false) = [
// 0 Sheet Plastic  3.6 x  6.6 Rectangular with Mirror Glass Pattern
// 0 Name: 20193.dat
// 0 Author: Willy Tschager [Holly-Wood]
// 0 !LDRAW_ORG Part UPDATE 2019-03
// 0 !LICENSE Licensed under CC BY 2.0 and CC BY 4.0 : see CAreadme.txt
// 
// 0 BFC CERTIFY CCW
  [0,"BFC","CERTIFY"],
  [0,"BFC","CCW"],
// 
// 0 !CATEGORY Sheet Plastic
// 0 !KEYWORDS set 10246, Set 10255
// 
// 0 !CMDLINE -c15
// 
// 0 !HISTORY 2019-12-27 [PTadmin] Official Update 2019-03
// 
// 
// 0 // Bottom
// 1 16 -63.5 0 34 0 0 -2 0 -1 0 2 0 0 1-4chrd.dat
  [1,16,-63.5,0,34,0,0,-2,0,-1,0,2,0,0, ldraw_lib__1_4chrd(realsolid)],
// 1 16 63.5 0 34 2 0 0 0 -1 0 0 0 2 1-4chrd.dat
  [1,16,63.5,0,34,2,0,0,0,-1,0,0,0,2, ldraw_lib__1_4chrd(realsolid)],
// 1 16 63.5 0 -34 0 0 2 0 -1 0 -2 0 0 1-4chrd.dat
  [1,16,63.5,0,-34,0,0,2,0,-1,0,-2,0,0, ldraw_lib__1_4chrd(realsolid)],
// 1 16 -63.5 0 -34 -2 0 0 0 -1 0 0 0 -2 1-4chrd.dat
  [1,16,-63.5,0,-34,-2,0,0,0,-1,0,0,0,-2, ldraw_lib__1_4chrd(realsolid)],
// 
// 4 16 -65.5 0 -34 -65.5 0 34 -63.5 0 36 -63.5 0 -36
  [4,16,-65.5,0,-34,-65.5,0,34,-63.5,0,36,-63.5,0,-36],
// 4 16 -63.5 0 -36 -63.5 0 36 63.5 0 36 63.5 0 -36
  [4,16,-63.5,0,-36,-63.5,0,36,63.5,0,36,63.5,0,-36],
// 4 16 63.5 0 36 65.5 0 34 65.5 0 -34 63.5 0 -36
  [4,16,63.5,0,36,65.5,0,34,65.5,0,-34,63.5,0,-36],
// 
// 0 // Sides
// 1 16 -63.5 -2.5 34 0 0 -2 0 2.5 0 2 0 0 1-4cylo.dat
  [1,16,-63.5,-2.5,34,0,0,-2,0,2.5,0,2,0,0, ldraw_lib__1_4cylo(realsolid)],
// 1 16 63.5 -2.5 34 2 0 0 0 2.5 0 0 0 2 1-4cylo.dat
  [1,16,63.5,-2.5,34,2,0,0,0,2.5,0,0,0,2, ldraw_lib__1_4cylo(realsolid)],
// 1 16 63.5 -2.5 -34 0 0 2 0 2.5 0 -2 0 0 1-4cylo.dat
  [1,16,63.5,-2.5,-34,0,0,2,0,2.5,0,-2,0,0, ldraw_lib__1_4cylo(realsolid)],
// 1 16 -63.5 -2.5 -34 -2 0 0 0 2.5 0 0 0 -2 1-4cylo.dat
  [1,16,-63.5,-2.5,-34,-2,0,0,0,2.5,0,0,0,-2, ldraw_lib__1_4cylo(realsolid)],
// 
// 1 16 -65.5 -1.25 0 0 1 0 0 0 -1.25 -34 0 0 rect2p.dat
  [1,16,-65.5,-1.25,0,0,1,0,0,0,-1.25,-34,0,0, ldraw_lib__rect2p(realsolid)],
// 1 16 0 -1.25 36 -63.5 0 0 0 0 -1.25 0 -1 0 rect2p.dat
  [1,16,0,-1.25,36,-63.5,0,0,0,0,-1.25,0,-1,0, ldraw_lib__rect2p(realsolid)],
// 1 16 65.5 -1.25 0 0 -1 0 0 0 -1.25 34 0 0 rect2p.dat
  [1,16,65.5,-1.25,0,0,-1,0,0,0,-1.25,34,0,0, ldraw_lib__rect2p(realsolid)],
// 1 16 0 -1.25 -36 63.5 0 0 0 0 -1.25 0 1 0 rect2p.dat
  [1,16,0,-1.25,-36,63.5,0,0,0,0,-1.25,0,1,0, ldraw_lib__rect2p(realsolid)],
// 
// 0 // Top
// 1 383 -63.5 -2.5 34 0 0 -2 0 1 0 2 0 0 1-4chrd.dat
  [1,383,-63.5,-2.5,34,0,0,-2,0,1,0,2,0,0, ldraw_lib__1_4chrd(realsolid)],
// 1 383 63.5 -2.5 34 2 0 0 0 1 0 0 0 2 1-4chrd.dat
  [1,383,63.5,-2.5,34,2,0,0,0,1,0,0,0,2, ldraw_lib__1_4chrd(realsolid)],
// 1 383 63.5 -2.5 -34 0 0 2 0 1 0 -2 0 0 1-4chrd.dat
  [1,383,63.5,-2.5,-34,0,0,2,0,1,0,-2,0,0, ldraw_lib__1_4chrd(realsolid)],
// 1 383 -63.5 -2.5 -34 -2 0 0 0 1 0 0 0 -2 1-4chrd.dat
  [1,383,-63.5,-2.5,-34,-2,0,0,0,1,0,0,0,-2, ldraw_lib__1_4chrd(realsolid)],
// 
// 4 383 -63.5 -2.5 36 -65.5 -2.5 34 -65.5 -2.5 -34 -63.5 -2.5 -36
  [4,383,-63.5,-2.5,36,-65.5,-2.5,34,-65.5,-2.5,-34,-63.5,-2.5,-36],
// 4 383 63.5 -2.5 36 -63.5 -2.5 36 -63.5 -2.5 -36 63.5 -2.5 -36
  [4,383,63.5,-2.5,36,-63.5,-2.5,36,-63.5,-2.5,-36,63.5,-2.5,-36],
// 4 383 65.5 -2.5 -34 65.5 -2.5 34 63.5 -2.5 36 63.5 -2.5 -36
  [4,383,65.5,-2.5,-34,65.5,-2.5,34,63.5,-2.5,36,63.5,-2.5,-36],
];
module ldraw_lib__20193(step=0, col=false, unit=2/5, alt=false, line=0.2, solid=!$preview)
    makepoly(ldraw_lib__20193(solid), step=step, col=col, unit=unit, alt=alt, line=line, solid=solid);
ldraw_lib__20193(line=0.2);
